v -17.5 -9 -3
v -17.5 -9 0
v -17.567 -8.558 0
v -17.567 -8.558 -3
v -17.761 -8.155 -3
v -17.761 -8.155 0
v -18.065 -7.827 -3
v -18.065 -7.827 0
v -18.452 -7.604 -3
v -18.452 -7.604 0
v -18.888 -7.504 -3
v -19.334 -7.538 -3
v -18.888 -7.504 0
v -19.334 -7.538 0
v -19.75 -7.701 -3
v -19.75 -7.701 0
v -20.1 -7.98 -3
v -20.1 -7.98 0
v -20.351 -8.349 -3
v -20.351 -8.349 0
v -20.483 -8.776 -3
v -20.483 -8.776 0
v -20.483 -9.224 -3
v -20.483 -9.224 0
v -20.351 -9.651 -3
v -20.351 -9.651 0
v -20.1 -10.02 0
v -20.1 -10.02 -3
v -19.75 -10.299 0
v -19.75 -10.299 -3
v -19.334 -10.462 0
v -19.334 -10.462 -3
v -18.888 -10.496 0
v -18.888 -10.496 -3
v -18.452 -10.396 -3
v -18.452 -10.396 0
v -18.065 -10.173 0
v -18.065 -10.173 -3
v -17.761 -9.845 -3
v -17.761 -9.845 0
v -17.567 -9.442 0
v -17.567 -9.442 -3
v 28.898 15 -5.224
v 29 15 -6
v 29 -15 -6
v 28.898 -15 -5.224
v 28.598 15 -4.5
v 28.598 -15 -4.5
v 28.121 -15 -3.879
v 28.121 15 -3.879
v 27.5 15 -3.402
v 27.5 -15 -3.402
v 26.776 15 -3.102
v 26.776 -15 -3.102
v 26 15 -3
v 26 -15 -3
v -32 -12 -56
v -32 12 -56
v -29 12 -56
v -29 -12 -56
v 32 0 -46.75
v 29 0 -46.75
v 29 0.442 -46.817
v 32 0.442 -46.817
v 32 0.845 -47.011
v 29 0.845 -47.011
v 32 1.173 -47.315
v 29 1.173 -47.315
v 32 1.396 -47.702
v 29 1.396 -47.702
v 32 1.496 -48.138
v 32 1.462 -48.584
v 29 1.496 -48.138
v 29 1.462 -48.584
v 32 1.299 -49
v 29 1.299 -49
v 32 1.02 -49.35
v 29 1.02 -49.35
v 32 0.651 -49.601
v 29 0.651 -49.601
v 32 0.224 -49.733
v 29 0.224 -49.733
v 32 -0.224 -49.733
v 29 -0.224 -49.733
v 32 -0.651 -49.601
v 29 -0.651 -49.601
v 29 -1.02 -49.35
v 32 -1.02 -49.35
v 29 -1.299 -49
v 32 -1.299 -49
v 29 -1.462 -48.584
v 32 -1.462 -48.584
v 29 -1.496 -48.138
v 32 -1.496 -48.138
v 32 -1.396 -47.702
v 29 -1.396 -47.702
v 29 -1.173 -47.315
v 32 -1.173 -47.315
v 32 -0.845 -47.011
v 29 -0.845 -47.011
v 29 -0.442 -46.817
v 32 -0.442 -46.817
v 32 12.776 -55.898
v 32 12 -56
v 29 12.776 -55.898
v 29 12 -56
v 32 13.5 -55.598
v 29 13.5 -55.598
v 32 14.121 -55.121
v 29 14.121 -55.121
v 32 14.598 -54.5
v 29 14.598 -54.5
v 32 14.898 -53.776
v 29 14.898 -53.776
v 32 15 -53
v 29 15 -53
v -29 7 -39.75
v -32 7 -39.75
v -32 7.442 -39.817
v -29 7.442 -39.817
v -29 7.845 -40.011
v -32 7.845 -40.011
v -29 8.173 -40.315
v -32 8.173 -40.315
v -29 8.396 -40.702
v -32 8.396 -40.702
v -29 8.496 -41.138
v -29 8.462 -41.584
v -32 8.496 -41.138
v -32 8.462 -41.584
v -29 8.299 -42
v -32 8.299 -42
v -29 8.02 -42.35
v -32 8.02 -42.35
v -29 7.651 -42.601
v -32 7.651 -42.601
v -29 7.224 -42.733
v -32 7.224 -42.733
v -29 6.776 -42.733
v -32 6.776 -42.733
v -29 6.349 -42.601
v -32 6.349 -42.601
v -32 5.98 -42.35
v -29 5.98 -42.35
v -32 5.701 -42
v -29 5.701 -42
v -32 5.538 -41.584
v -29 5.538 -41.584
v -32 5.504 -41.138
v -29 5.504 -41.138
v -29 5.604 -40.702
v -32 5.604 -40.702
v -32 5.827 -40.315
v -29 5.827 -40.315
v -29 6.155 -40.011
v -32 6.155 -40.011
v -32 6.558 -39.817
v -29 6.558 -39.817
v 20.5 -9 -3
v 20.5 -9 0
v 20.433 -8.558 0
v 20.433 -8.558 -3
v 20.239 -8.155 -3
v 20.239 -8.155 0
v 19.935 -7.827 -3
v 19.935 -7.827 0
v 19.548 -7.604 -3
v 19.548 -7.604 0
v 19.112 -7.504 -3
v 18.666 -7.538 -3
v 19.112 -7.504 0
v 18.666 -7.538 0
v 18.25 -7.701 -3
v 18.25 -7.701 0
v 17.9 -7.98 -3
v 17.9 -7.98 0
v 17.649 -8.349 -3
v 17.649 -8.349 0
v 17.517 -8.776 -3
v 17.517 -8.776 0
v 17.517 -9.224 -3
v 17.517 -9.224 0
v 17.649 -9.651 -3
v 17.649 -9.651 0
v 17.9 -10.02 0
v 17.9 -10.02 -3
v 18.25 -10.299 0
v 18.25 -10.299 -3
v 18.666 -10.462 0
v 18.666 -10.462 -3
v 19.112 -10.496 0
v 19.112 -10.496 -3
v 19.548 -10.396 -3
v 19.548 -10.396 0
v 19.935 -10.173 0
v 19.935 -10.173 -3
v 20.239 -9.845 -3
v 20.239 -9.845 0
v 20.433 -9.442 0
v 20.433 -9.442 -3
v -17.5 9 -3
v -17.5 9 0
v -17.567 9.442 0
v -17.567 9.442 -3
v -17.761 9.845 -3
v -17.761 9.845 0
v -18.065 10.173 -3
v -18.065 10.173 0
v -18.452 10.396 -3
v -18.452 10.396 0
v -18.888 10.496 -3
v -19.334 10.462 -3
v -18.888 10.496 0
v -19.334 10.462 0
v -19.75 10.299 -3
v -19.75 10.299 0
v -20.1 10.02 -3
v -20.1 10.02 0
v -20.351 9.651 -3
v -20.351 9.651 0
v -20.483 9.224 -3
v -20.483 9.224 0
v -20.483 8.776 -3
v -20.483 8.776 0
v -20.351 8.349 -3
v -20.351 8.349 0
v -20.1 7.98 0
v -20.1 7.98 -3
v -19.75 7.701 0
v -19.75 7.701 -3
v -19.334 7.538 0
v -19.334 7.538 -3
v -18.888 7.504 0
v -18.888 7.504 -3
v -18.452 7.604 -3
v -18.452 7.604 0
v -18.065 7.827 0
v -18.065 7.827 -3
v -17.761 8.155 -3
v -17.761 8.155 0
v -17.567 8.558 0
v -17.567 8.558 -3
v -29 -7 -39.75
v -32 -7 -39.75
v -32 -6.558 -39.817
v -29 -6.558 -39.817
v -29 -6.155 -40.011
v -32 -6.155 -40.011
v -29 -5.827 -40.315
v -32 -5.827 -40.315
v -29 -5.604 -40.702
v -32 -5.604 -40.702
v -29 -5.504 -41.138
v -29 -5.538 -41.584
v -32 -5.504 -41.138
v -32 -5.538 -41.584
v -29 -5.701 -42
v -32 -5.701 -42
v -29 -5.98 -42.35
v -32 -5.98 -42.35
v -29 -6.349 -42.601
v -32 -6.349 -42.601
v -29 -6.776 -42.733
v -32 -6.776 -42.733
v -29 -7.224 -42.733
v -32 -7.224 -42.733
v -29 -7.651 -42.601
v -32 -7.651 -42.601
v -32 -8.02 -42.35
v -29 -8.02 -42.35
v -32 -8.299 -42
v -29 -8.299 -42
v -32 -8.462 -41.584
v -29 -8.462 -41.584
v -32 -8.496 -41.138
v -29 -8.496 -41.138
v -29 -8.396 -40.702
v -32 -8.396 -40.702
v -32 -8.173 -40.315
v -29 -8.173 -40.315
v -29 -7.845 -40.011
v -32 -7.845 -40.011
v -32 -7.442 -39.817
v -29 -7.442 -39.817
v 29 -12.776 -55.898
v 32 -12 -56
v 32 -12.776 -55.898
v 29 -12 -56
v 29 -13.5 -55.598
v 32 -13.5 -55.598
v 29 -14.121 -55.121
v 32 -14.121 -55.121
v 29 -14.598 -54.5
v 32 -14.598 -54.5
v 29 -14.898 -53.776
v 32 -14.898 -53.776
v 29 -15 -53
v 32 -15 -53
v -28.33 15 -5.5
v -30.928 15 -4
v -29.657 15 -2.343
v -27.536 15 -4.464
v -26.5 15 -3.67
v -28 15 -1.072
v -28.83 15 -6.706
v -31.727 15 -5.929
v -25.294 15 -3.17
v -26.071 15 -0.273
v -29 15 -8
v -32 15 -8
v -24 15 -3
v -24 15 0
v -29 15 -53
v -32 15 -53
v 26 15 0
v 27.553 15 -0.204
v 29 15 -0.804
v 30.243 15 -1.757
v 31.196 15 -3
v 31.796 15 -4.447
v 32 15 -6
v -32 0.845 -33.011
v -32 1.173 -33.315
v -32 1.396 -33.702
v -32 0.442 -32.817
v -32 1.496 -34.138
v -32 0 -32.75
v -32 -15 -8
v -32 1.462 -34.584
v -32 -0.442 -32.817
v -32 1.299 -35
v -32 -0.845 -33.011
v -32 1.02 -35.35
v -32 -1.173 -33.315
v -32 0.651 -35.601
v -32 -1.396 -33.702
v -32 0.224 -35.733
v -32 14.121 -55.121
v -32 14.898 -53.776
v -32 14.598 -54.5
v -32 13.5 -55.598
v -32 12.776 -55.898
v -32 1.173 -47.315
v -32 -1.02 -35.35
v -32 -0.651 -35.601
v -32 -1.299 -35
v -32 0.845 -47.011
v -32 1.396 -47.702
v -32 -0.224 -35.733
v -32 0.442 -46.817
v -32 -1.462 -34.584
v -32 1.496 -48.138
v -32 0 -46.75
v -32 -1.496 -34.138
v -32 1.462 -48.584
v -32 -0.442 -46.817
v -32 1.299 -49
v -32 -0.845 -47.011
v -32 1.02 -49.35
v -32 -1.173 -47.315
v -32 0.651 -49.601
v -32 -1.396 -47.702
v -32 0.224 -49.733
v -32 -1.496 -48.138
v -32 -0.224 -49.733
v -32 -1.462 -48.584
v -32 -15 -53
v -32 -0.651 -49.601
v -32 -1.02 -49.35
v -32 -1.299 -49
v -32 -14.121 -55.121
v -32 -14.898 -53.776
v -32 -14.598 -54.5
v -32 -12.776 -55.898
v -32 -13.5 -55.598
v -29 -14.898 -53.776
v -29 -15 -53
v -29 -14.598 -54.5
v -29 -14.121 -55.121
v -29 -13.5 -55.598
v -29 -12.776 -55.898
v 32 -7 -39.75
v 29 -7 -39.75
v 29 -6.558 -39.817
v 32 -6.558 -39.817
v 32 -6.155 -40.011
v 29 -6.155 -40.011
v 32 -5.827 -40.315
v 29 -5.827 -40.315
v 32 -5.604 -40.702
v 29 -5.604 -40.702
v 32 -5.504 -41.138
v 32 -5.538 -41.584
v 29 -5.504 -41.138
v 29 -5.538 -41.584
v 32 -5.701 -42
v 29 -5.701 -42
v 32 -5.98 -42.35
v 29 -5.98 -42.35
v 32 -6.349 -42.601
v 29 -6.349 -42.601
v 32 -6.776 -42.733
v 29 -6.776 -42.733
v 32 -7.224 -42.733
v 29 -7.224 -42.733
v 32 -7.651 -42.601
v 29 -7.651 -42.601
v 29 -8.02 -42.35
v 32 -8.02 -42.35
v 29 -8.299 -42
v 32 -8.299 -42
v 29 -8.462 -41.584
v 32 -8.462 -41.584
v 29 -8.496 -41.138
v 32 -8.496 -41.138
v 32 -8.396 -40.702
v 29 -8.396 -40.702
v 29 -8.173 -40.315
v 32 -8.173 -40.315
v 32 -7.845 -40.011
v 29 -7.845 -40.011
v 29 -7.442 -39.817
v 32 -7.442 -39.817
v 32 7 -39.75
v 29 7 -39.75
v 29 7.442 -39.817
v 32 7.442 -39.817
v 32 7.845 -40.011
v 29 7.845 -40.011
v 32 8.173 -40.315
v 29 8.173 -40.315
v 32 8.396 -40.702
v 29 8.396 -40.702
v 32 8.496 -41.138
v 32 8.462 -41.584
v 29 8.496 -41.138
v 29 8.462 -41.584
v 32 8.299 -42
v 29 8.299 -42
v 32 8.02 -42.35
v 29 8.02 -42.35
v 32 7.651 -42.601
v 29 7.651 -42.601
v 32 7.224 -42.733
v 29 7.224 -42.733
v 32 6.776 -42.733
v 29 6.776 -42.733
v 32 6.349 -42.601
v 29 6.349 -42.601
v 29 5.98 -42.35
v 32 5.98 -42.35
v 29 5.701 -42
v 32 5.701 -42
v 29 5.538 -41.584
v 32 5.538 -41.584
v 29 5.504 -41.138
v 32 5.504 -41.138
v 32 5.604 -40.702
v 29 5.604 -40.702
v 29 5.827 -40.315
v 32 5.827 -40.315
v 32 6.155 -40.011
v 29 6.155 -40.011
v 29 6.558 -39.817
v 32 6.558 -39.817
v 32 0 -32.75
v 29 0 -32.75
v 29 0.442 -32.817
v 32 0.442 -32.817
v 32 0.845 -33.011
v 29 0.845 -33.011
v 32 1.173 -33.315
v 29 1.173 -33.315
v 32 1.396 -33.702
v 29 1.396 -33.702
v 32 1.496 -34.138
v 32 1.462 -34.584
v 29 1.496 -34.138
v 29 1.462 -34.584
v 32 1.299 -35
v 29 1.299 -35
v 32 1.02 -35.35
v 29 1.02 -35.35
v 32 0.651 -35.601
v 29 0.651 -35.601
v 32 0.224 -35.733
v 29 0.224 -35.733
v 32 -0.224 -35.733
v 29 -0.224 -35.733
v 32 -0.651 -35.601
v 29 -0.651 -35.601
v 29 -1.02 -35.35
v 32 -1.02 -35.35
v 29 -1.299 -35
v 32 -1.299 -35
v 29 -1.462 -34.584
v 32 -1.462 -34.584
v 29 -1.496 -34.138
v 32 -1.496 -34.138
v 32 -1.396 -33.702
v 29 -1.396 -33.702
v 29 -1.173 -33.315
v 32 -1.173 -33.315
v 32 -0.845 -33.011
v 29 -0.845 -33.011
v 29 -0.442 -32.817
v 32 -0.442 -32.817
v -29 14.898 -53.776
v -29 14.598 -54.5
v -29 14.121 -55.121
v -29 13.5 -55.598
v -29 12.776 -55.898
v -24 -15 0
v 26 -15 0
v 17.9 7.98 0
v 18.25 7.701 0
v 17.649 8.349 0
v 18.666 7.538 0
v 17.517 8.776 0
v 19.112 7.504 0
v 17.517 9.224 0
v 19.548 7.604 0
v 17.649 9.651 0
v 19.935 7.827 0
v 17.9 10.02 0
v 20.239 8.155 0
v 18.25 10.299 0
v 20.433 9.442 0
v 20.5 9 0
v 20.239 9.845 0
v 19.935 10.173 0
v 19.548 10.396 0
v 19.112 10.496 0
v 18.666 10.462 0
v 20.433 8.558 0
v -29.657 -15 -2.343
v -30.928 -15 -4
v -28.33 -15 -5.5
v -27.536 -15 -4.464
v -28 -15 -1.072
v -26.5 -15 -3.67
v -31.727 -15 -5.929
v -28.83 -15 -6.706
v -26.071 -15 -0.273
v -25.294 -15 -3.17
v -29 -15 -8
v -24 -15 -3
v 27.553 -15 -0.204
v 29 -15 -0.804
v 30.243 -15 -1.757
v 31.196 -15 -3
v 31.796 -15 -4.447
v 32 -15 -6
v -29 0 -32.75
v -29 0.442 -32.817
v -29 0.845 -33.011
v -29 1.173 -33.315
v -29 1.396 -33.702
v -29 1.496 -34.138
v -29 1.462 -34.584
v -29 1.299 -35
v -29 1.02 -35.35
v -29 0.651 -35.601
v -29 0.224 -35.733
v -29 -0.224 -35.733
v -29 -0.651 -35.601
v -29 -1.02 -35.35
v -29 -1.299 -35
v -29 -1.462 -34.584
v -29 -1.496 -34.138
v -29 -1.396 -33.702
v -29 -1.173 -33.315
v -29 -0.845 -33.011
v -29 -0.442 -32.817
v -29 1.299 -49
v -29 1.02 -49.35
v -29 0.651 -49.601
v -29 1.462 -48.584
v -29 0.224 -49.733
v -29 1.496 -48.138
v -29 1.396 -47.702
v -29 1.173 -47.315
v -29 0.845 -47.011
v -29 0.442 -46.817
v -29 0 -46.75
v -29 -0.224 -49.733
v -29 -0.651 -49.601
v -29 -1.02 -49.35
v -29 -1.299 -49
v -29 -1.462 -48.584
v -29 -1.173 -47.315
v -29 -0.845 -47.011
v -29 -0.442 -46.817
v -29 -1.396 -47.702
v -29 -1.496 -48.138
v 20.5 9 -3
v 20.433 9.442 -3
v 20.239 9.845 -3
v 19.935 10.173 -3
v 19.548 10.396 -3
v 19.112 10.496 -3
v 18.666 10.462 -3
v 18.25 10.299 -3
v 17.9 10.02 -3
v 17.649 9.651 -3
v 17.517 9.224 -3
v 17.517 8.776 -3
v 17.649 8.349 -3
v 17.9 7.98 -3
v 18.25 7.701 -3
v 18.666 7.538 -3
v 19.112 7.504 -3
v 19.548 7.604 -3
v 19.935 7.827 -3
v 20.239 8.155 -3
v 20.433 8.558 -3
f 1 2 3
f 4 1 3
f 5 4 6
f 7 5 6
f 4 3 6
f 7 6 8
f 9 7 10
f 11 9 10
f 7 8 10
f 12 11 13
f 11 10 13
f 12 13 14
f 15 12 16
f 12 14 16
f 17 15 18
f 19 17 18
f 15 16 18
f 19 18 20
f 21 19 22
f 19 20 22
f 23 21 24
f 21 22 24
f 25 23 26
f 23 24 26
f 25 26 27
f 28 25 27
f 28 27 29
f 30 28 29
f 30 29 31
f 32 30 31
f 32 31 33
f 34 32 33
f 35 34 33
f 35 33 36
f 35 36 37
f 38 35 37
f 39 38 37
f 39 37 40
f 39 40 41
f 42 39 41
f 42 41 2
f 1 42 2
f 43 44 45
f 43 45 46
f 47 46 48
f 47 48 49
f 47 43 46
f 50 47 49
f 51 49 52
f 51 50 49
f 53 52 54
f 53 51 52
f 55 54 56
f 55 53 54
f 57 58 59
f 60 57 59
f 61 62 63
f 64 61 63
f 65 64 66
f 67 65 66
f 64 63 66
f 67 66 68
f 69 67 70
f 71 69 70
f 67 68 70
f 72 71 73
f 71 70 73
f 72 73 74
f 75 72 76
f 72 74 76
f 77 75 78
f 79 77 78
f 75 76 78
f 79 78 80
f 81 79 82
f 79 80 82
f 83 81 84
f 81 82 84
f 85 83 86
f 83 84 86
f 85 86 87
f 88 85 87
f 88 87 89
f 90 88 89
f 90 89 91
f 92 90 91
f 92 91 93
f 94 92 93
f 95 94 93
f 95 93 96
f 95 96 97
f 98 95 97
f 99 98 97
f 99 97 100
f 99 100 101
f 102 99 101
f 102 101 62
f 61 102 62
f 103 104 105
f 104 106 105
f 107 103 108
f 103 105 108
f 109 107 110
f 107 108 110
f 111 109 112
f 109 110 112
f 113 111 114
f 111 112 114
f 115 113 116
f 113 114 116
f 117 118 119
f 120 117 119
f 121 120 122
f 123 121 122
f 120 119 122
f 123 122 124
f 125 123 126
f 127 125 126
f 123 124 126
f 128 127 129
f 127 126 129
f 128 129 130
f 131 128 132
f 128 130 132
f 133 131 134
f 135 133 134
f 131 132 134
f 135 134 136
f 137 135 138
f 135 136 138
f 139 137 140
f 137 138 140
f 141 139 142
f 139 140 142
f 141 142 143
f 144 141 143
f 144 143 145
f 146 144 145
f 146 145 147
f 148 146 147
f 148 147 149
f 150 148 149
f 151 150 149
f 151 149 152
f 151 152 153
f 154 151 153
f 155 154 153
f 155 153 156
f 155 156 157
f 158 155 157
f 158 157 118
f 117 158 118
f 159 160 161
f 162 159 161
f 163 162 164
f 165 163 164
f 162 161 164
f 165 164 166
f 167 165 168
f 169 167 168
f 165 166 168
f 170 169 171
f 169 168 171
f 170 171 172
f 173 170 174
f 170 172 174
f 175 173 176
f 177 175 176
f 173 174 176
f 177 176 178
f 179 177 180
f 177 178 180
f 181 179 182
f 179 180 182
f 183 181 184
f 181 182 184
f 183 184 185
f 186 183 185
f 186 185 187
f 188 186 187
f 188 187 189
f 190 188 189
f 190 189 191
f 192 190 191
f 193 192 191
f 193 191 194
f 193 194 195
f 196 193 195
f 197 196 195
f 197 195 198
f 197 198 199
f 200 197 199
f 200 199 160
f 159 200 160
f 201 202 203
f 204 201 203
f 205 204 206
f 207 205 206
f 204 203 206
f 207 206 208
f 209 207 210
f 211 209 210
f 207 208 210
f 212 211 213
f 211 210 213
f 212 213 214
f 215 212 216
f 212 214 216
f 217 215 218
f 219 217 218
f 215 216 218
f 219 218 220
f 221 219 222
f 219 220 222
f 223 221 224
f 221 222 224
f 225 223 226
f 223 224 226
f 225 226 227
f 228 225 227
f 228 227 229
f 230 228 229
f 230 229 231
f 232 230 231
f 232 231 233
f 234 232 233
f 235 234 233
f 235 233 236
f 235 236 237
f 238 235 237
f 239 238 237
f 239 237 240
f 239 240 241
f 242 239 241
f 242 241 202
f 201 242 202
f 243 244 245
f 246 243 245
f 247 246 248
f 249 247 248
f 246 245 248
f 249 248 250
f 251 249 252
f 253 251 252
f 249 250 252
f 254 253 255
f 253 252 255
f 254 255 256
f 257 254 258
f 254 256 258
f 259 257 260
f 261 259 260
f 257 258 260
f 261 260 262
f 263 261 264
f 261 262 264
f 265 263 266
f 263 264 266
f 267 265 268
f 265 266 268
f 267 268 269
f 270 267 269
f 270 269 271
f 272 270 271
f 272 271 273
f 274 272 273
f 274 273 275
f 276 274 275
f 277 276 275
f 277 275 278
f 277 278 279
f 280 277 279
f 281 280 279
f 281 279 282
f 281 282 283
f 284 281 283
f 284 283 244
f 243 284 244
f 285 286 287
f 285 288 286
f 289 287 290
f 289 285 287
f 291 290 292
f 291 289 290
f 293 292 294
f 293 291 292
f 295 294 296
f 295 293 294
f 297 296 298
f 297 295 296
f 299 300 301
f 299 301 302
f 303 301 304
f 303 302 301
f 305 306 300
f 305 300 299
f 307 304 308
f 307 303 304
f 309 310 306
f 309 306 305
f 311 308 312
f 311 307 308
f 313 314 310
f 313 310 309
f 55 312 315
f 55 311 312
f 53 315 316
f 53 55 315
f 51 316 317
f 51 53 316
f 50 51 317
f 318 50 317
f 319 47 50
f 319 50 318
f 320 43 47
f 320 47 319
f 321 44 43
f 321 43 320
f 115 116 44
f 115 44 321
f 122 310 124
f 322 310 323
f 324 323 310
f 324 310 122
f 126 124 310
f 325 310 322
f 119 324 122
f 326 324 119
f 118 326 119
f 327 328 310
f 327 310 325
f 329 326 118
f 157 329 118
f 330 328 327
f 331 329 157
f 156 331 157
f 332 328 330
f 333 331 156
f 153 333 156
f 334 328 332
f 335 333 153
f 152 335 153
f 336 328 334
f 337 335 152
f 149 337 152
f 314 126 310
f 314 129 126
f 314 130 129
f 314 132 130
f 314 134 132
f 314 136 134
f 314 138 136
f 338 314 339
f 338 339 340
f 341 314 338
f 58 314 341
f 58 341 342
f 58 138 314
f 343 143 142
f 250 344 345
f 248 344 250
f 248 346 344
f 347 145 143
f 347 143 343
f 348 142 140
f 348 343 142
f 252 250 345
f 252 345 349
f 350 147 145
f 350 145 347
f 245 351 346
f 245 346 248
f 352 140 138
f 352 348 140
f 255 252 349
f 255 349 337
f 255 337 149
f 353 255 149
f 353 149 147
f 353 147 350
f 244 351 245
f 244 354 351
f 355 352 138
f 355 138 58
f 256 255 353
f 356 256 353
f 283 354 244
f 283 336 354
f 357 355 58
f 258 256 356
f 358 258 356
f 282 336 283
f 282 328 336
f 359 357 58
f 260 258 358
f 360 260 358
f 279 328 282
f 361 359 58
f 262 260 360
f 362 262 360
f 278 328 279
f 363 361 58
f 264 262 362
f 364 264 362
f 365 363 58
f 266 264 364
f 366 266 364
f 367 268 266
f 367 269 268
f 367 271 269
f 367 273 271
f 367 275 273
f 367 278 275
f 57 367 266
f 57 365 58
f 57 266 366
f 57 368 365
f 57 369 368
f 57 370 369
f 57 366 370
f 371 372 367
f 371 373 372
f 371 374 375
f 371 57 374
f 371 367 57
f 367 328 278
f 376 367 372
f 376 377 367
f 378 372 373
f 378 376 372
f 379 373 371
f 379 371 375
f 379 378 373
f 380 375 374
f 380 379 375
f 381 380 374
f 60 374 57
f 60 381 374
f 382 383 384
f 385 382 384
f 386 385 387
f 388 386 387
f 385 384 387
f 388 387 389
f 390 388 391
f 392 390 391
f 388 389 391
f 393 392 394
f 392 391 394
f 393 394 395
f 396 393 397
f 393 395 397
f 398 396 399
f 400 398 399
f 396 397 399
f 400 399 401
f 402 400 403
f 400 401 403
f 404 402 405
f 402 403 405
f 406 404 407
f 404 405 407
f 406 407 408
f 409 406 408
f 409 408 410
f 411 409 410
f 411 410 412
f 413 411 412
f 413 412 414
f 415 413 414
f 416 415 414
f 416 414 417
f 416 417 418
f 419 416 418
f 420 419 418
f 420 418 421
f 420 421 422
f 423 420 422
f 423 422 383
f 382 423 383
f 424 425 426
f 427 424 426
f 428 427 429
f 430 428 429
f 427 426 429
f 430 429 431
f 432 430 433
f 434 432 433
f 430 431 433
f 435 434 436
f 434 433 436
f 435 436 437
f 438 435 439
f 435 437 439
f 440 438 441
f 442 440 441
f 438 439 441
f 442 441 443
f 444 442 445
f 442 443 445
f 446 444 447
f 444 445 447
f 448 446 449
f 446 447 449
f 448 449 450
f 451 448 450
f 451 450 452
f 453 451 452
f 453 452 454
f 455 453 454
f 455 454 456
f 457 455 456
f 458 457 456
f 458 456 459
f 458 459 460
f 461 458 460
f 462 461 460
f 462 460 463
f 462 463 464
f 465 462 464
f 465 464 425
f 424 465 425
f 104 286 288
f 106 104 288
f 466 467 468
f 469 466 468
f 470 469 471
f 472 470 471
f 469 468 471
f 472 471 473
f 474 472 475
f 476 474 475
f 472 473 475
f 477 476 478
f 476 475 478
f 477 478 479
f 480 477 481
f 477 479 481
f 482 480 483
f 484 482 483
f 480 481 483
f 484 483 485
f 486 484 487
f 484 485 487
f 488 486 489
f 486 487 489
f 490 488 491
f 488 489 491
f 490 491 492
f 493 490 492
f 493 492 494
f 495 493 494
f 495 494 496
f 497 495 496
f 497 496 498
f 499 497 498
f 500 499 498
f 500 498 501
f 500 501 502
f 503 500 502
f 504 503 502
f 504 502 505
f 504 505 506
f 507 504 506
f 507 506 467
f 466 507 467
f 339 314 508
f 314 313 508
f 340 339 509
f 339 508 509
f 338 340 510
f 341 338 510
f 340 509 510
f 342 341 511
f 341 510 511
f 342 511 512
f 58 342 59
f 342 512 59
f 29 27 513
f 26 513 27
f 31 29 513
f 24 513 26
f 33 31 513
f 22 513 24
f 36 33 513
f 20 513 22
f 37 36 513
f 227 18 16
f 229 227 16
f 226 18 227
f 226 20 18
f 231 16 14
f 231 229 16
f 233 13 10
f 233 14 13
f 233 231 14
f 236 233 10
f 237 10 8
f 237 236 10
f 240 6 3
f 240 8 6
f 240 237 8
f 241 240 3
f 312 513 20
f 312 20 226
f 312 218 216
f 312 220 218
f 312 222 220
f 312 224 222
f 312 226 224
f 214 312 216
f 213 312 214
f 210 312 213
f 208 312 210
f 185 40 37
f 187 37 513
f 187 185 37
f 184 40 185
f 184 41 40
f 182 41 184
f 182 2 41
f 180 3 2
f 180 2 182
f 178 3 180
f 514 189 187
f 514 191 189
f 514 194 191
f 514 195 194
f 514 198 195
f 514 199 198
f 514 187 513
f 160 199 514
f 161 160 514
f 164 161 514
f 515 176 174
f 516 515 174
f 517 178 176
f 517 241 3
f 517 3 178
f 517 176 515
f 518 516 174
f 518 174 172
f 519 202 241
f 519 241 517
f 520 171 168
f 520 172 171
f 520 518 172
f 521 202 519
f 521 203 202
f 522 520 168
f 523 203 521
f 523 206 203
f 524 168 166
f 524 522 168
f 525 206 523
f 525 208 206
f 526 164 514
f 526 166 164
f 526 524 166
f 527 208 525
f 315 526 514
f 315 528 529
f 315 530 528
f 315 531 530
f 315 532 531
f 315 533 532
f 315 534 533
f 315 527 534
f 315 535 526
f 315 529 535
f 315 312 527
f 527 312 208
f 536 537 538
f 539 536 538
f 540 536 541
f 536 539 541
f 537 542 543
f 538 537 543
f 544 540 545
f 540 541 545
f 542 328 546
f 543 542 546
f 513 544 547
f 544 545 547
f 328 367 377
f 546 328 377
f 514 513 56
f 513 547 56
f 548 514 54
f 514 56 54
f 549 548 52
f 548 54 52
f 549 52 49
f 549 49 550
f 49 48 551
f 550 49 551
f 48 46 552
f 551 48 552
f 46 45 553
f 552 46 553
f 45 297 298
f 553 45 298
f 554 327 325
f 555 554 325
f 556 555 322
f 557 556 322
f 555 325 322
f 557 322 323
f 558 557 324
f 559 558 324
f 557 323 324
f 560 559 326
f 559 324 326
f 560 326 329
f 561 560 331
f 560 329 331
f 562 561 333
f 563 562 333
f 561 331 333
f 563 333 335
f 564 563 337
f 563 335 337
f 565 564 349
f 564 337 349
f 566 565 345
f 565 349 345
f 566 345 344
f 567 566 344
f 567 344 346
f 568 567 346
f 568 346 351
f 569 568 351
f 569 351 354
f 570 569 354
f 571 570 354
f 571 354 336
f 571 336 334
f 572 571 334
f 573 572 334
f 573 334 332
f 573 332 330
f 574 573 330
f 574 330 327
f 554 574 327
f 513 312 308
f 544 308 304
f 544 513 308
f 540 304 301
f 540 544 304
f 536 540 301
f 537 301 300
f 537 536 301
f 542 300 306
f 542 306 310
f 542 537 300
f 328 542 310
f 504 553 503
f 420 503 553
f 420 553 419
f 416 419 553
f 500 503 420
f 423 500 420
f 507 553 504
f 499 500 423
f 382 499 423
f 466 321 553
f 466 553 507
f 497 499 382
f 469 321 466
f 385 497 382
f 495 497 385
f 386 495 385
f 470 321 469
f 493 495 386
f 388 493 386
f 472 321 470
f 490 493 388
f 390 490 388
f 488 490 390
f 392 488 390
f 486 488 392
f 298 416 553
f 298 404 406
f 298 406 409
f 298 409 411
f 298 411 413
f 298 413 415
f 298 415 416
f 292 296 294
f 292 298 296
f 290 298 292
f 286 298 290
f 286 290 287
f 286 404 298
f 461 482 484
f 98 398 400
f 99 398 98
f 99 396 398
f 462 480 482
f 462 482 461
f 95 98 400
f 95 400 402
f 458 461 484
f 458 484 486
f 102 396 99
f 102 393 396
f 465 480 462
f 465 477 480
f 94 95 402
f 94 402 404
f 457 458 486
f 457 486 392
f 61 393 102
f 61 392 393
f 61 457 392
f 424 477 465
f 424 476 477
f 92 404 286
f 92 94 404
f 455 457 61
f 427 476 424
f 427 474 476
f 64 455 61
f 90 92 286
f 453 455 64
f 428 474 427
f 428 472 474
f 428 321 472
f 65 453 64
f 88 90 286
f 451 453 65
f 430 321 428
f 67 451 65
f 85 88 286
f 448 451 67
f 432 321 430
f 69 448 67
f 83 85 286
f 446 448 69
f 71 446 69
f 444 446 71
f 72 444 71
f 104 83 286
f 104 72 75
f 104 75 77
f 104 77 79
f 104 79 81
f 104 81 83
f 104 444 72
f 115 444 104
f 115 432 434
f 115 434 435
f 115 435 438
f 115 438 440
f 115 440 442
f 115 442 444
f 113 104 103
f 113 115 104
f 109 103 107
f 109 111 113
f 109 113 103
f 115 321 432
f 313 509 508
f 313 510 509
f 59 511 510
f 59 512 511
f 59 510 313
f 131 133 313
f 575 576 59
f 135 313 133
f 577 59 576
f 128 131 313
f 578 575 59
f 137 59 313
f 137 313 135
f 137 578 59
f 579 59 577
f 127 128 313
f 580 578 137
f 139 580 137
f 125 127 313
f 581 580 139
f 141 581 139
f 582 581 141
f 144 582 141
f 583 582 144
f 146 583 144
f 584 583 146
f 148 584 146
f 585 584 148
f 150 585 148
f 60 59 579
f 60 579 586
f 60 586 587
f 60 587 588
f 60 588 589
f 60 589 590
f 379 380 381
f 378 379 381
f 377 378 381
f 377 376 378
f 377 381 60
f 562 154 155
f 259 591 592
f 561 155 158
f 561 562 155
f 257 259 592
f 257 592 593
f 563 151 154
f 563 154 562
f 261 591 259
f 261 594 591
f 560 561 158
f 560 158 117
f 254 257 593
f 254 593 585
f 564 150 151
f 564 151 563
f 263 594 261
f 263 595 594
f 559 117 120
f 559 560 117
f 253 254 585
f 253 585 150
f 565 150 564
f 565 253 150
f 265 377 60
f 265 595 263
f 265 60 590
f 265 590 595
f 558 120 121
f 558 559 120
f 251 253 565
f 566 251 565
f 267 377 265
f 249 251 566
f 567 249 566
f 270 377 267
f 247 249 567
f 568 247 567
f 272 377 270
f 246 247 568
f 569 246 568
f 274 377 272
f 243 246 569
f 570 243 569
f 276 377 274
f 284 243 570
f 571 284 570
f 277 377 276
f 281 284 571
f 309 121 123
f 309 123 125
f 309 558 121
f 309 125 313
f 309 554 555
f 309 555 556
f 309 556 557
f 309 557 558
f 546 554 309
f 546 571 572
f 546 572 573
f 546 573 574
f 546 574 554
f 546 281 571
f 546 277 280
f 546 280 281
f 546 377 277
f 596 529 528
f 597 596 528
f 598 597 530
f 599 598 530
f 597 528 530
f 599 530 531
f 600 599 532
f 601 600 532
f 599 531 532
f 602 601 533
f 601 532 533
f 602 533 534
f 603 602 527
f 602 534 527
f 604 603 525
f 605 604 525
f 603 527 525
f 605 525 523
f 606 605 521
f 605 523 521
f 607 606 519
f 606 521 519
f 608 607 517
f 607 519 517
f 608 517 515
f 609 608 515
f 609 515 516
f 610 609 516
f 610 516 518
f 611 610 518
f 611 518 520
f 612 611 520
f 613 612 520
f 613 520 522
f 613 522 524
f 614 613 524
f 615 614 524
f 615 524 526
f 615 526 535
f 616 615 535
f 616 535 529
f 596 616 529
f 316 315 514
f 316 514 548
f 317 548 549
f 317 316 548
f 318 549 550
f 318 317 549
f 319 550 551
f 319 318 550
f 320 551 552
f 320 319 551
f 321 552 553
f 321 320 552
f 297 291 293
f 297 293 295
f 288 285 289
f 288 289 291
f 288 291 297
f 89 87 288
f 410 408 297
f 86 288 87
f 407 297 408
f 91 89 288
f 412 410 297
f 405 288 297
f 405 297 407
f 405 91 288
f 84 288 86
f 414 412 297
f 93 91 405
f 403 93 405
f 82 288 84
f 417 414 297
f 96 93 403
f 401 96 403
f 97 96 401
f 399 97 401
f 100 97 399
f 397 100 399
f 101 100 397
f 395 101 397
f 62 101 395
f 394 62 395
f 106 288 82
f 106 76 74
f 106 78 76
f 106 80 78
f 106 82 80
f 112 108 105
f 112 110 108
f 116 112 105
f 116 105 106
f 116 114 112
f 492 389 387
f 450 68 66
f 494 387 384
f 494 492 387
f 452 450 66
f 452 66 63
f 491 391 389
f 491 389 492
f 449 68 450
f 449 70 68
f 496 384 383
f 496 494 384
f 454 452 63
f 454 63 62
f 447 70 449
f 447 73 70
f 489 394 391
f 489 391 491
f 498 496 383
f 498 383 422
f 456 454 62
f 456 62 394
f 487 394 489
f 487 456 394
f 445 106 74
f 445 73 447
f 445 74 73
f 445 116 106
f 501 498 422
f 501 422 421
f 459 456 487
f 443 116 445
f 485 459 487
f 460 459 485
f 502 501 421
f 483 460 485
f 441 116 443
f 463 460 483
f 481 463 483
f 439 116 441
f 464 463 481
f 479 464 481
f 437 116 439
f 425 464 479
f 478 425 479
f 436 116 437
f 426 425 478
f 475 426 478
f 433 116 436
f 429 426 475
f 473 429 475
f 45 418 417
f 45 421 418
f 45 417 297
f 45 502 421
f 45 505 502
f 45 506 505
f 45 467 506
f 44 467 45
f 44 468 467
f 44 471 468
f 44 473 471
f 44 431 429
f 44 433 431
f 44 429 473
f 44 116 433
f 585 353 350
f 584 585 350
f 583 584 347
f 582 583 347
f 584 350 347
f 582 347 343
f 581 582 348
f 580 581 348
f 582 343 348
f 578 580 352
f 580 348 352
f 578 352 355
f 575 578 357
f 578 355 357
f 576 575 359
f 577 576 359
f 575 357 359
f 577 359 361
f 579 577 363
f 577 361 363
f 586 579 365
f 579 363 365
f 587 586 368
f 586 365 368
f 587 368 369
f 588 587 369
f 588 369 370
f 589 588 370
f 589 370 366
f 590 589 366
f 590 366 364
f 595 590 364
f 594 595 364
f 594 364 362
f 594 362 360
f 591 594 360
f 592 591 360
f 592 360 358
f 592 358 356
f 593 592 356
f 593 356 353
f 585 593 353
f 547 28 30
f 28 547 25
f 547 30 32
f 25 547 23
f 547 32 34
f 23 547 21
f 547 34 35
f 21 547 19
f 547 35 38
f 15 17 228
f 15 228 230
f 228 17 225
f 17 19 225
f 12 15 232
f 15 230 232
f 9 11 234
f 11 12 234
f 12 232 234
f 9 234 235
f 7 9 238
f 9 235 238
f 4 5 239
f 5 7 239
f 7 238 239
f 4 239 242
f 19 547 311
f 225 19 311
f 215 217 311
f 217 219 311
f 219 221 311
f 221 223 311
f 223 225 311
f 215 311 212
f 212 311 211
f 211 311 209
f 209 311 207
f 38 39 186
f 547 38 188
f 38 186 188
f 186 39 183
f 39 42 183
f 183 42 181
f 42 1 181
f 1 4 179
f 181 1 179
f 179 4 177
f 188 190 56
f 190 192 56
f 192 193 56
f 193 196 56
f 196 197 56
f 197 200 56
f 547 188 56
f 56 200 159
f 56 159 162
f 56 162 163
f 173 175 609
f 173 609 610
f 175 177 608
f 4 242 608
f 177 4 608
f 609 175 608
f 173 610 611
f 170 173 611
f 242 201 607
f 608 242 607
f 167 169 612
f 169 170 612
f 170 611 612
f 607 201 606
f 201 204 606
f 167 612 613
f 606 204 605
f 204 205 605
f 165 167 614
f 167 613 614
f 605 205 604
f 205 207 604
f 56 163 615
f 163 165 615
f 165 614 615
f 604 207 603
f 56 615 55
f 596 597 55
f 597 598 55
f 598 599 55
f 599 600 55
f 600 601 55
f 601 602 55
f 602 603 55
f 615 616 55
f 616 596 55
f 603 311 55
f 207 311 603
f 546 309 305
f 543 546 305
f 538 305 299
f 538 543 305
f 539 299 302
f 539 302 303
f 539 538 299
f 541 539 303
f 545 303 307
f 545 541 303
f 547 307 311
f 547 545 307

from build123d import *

# Parameters (mm, degrees)
SKETCH_1_W                       = 58
SKETCH_1_H                       = 30
SM_BASE_FLANGE_2_DEPTH           = 3
SM_EDGE_FLANGE_1_STRIP_W         = 22
SM_EDGE_FLANGE_1_STRIP_H         = 3
SM_EDGE_FLANGE_1_STRIP_CUT_DEPTH = 30
SM_EDGE_FLANGE_1_DEPTH           = 30
SM_EDGE_FLANGE_2_STRIP_W         = 18
SM_EDGE_FLANGE_2_STRIP_H         = 3
SM_EDGE_FLANGE_2_STRIP_CUT_DEPTH = 30
SM_EDGE_FLANGE_2_DEPTH           = 30
FILLET_1_R                       = 3
SKETCH_14_R                      = 1.5
CUT_EXTRUDE_1_DEPTH              = 87.353922899
SKETCH_15_R                      = 1.5
CUT_EXTRUDE_2_DEPTH              = 67.219332525


# Sheet-metal steps are written as plain solids
with BuildPart() as part:
    # Sketch 1 → 基体-法兰2 (new body)
    with BuildSketch(Plane.XY):
        Rectangle(SKETCH_1_W, SKETCH_1_H)
    extrude(amount=-SM_BASE_FLANGE_2_DEPTH)

    # 边线-法兰1 strip (across the edge) → 边线-法兰1 strip cut (cut)
    with BuildSketch(Plane(origin=(-29, -15, -3), x_dir=(1, 0, 0), z_dir=(0, 1, 0))):
        with Locations((-6, -1.5)):
            Rectangle(SM_EDGE_FLANGE_1_STRIP_W, SM_EDGE_FLANGE_1_STRIP_H)
    extrude(amount=SM_EDGE_FLANGE_1_STRIP_CUT_DEPTH, mode=Mode.SUBTRACT)

    # 边线-法兰1 section (across the edge) → 边线-法兰1 (add)
    with BuildSketch(Plane(origin=(-29, -15, -3), x_dir=(1, 0, 0), z_dir=(0, 1, 0))):
        with BuildLine():
            Line((-3, 5), (-3, 53))
            Line((-3, 53), (0, 53))
            Line((0, 53), (0, 5))
            ThreePointArc((0, 5), (1.464466094, 1.464466094), (5, 0))
            Line((5, 0), (5, -3))
            ThreePointArc((5, -3), (-0.656854249, -0.656854249), (-3, 5))
        make_face()
    extrude(amount=SM_EDGE_FLANGE_1_DEPTH)

    # 边线-法兰2 strip (across the edge) → 边线-法兰2 strip cut (cut)
    with BuildSketch(Plane(origin=(29, 15, -3), x_dir=(-1, 0, 0), z_dir=(0, -1, 0))):
        with Locations((-6, -1.5)):
            Rectangle(SM_EDGE_FLANGE_2_STRIP_W, SM_EDGE_FLANGE_2_STRIP_H)
    extrude(amount=SM_EDGE_FLANGE_2_STRIP_CUT_DEPTH, mode=Mode.SUBTRACT)

    # 边线-法兰2 section (across the edge) → 边线-法兰2 (add)
    with BuildSketch(Plane(origin=(29, 15, -3), x_dir=(-1, 0, 0), z_dir=(0, -1, 0))):
        with BuildLine():
            Line((-3, 3), (-3, 53))
            Line((-3, 53), (0, 53))
            Line((0, 53), (0, 3))
            ThreePointArc((0, 3), (0.878679656, 0.878679656), (3, 0))
            Line((3, 0), (3, -3))
            ThreePointArc((3, -3), (-1.242640687, -1.242640687), (-3, 3))
        make_face()
    extrude(amount=SM_EDGE_FLANGE_2_DEPTH)

    # 圆角1
    fillet_1_edges = [part.edges().sort_by_distance(p)[0] for p in [
        (-30.5, -15, -56),
        (-30.5, 15, -56),
        (30.5, 15, -56),
        (30.5, -15, -56),
    ]]
    fillet(fillet_1_edges, radius=FILLET_1_R)

    # 草图14 → 切除-拉伸1 (cut, through all)
    with BuildSketch(Plane.ZY.offset(32)):
        with Locations((-34.25, 0)):
            Circle(SKETCH_14_R)
        with Locations((-41.25, 7)):
            Circle(SKETCH_14_R)
        with Locations((-48.25, 0)):
            Circle(SKETCH_14_R)
        with Locations((-41.25, -7)):
            Circle(SKETCH_14_R)
    extrude(amount=-CUT_EXTRUDE_1_DEPTH, mode=Mode.SUBTRACT)

    # 草图15 → 切除-拉伸2 (cut, through all)
    with BuildSketch(Plane.XY):
        with Locations((19, 9)):
            Circle(SKETCH_15_R)
        with Locations((19, -9)):
            Circle(SKETCH_15_R)
        with Locations((-19, -9)):
            Circle(SKETCH_15_R)
        with Locations((-19, 9)):
            Circle(SKETCH_15_R)
    extrude(amount=-CUT_EXTRUDE_2_DEPTH, mode=Mode.SUBTRACT)


solid = part.part
